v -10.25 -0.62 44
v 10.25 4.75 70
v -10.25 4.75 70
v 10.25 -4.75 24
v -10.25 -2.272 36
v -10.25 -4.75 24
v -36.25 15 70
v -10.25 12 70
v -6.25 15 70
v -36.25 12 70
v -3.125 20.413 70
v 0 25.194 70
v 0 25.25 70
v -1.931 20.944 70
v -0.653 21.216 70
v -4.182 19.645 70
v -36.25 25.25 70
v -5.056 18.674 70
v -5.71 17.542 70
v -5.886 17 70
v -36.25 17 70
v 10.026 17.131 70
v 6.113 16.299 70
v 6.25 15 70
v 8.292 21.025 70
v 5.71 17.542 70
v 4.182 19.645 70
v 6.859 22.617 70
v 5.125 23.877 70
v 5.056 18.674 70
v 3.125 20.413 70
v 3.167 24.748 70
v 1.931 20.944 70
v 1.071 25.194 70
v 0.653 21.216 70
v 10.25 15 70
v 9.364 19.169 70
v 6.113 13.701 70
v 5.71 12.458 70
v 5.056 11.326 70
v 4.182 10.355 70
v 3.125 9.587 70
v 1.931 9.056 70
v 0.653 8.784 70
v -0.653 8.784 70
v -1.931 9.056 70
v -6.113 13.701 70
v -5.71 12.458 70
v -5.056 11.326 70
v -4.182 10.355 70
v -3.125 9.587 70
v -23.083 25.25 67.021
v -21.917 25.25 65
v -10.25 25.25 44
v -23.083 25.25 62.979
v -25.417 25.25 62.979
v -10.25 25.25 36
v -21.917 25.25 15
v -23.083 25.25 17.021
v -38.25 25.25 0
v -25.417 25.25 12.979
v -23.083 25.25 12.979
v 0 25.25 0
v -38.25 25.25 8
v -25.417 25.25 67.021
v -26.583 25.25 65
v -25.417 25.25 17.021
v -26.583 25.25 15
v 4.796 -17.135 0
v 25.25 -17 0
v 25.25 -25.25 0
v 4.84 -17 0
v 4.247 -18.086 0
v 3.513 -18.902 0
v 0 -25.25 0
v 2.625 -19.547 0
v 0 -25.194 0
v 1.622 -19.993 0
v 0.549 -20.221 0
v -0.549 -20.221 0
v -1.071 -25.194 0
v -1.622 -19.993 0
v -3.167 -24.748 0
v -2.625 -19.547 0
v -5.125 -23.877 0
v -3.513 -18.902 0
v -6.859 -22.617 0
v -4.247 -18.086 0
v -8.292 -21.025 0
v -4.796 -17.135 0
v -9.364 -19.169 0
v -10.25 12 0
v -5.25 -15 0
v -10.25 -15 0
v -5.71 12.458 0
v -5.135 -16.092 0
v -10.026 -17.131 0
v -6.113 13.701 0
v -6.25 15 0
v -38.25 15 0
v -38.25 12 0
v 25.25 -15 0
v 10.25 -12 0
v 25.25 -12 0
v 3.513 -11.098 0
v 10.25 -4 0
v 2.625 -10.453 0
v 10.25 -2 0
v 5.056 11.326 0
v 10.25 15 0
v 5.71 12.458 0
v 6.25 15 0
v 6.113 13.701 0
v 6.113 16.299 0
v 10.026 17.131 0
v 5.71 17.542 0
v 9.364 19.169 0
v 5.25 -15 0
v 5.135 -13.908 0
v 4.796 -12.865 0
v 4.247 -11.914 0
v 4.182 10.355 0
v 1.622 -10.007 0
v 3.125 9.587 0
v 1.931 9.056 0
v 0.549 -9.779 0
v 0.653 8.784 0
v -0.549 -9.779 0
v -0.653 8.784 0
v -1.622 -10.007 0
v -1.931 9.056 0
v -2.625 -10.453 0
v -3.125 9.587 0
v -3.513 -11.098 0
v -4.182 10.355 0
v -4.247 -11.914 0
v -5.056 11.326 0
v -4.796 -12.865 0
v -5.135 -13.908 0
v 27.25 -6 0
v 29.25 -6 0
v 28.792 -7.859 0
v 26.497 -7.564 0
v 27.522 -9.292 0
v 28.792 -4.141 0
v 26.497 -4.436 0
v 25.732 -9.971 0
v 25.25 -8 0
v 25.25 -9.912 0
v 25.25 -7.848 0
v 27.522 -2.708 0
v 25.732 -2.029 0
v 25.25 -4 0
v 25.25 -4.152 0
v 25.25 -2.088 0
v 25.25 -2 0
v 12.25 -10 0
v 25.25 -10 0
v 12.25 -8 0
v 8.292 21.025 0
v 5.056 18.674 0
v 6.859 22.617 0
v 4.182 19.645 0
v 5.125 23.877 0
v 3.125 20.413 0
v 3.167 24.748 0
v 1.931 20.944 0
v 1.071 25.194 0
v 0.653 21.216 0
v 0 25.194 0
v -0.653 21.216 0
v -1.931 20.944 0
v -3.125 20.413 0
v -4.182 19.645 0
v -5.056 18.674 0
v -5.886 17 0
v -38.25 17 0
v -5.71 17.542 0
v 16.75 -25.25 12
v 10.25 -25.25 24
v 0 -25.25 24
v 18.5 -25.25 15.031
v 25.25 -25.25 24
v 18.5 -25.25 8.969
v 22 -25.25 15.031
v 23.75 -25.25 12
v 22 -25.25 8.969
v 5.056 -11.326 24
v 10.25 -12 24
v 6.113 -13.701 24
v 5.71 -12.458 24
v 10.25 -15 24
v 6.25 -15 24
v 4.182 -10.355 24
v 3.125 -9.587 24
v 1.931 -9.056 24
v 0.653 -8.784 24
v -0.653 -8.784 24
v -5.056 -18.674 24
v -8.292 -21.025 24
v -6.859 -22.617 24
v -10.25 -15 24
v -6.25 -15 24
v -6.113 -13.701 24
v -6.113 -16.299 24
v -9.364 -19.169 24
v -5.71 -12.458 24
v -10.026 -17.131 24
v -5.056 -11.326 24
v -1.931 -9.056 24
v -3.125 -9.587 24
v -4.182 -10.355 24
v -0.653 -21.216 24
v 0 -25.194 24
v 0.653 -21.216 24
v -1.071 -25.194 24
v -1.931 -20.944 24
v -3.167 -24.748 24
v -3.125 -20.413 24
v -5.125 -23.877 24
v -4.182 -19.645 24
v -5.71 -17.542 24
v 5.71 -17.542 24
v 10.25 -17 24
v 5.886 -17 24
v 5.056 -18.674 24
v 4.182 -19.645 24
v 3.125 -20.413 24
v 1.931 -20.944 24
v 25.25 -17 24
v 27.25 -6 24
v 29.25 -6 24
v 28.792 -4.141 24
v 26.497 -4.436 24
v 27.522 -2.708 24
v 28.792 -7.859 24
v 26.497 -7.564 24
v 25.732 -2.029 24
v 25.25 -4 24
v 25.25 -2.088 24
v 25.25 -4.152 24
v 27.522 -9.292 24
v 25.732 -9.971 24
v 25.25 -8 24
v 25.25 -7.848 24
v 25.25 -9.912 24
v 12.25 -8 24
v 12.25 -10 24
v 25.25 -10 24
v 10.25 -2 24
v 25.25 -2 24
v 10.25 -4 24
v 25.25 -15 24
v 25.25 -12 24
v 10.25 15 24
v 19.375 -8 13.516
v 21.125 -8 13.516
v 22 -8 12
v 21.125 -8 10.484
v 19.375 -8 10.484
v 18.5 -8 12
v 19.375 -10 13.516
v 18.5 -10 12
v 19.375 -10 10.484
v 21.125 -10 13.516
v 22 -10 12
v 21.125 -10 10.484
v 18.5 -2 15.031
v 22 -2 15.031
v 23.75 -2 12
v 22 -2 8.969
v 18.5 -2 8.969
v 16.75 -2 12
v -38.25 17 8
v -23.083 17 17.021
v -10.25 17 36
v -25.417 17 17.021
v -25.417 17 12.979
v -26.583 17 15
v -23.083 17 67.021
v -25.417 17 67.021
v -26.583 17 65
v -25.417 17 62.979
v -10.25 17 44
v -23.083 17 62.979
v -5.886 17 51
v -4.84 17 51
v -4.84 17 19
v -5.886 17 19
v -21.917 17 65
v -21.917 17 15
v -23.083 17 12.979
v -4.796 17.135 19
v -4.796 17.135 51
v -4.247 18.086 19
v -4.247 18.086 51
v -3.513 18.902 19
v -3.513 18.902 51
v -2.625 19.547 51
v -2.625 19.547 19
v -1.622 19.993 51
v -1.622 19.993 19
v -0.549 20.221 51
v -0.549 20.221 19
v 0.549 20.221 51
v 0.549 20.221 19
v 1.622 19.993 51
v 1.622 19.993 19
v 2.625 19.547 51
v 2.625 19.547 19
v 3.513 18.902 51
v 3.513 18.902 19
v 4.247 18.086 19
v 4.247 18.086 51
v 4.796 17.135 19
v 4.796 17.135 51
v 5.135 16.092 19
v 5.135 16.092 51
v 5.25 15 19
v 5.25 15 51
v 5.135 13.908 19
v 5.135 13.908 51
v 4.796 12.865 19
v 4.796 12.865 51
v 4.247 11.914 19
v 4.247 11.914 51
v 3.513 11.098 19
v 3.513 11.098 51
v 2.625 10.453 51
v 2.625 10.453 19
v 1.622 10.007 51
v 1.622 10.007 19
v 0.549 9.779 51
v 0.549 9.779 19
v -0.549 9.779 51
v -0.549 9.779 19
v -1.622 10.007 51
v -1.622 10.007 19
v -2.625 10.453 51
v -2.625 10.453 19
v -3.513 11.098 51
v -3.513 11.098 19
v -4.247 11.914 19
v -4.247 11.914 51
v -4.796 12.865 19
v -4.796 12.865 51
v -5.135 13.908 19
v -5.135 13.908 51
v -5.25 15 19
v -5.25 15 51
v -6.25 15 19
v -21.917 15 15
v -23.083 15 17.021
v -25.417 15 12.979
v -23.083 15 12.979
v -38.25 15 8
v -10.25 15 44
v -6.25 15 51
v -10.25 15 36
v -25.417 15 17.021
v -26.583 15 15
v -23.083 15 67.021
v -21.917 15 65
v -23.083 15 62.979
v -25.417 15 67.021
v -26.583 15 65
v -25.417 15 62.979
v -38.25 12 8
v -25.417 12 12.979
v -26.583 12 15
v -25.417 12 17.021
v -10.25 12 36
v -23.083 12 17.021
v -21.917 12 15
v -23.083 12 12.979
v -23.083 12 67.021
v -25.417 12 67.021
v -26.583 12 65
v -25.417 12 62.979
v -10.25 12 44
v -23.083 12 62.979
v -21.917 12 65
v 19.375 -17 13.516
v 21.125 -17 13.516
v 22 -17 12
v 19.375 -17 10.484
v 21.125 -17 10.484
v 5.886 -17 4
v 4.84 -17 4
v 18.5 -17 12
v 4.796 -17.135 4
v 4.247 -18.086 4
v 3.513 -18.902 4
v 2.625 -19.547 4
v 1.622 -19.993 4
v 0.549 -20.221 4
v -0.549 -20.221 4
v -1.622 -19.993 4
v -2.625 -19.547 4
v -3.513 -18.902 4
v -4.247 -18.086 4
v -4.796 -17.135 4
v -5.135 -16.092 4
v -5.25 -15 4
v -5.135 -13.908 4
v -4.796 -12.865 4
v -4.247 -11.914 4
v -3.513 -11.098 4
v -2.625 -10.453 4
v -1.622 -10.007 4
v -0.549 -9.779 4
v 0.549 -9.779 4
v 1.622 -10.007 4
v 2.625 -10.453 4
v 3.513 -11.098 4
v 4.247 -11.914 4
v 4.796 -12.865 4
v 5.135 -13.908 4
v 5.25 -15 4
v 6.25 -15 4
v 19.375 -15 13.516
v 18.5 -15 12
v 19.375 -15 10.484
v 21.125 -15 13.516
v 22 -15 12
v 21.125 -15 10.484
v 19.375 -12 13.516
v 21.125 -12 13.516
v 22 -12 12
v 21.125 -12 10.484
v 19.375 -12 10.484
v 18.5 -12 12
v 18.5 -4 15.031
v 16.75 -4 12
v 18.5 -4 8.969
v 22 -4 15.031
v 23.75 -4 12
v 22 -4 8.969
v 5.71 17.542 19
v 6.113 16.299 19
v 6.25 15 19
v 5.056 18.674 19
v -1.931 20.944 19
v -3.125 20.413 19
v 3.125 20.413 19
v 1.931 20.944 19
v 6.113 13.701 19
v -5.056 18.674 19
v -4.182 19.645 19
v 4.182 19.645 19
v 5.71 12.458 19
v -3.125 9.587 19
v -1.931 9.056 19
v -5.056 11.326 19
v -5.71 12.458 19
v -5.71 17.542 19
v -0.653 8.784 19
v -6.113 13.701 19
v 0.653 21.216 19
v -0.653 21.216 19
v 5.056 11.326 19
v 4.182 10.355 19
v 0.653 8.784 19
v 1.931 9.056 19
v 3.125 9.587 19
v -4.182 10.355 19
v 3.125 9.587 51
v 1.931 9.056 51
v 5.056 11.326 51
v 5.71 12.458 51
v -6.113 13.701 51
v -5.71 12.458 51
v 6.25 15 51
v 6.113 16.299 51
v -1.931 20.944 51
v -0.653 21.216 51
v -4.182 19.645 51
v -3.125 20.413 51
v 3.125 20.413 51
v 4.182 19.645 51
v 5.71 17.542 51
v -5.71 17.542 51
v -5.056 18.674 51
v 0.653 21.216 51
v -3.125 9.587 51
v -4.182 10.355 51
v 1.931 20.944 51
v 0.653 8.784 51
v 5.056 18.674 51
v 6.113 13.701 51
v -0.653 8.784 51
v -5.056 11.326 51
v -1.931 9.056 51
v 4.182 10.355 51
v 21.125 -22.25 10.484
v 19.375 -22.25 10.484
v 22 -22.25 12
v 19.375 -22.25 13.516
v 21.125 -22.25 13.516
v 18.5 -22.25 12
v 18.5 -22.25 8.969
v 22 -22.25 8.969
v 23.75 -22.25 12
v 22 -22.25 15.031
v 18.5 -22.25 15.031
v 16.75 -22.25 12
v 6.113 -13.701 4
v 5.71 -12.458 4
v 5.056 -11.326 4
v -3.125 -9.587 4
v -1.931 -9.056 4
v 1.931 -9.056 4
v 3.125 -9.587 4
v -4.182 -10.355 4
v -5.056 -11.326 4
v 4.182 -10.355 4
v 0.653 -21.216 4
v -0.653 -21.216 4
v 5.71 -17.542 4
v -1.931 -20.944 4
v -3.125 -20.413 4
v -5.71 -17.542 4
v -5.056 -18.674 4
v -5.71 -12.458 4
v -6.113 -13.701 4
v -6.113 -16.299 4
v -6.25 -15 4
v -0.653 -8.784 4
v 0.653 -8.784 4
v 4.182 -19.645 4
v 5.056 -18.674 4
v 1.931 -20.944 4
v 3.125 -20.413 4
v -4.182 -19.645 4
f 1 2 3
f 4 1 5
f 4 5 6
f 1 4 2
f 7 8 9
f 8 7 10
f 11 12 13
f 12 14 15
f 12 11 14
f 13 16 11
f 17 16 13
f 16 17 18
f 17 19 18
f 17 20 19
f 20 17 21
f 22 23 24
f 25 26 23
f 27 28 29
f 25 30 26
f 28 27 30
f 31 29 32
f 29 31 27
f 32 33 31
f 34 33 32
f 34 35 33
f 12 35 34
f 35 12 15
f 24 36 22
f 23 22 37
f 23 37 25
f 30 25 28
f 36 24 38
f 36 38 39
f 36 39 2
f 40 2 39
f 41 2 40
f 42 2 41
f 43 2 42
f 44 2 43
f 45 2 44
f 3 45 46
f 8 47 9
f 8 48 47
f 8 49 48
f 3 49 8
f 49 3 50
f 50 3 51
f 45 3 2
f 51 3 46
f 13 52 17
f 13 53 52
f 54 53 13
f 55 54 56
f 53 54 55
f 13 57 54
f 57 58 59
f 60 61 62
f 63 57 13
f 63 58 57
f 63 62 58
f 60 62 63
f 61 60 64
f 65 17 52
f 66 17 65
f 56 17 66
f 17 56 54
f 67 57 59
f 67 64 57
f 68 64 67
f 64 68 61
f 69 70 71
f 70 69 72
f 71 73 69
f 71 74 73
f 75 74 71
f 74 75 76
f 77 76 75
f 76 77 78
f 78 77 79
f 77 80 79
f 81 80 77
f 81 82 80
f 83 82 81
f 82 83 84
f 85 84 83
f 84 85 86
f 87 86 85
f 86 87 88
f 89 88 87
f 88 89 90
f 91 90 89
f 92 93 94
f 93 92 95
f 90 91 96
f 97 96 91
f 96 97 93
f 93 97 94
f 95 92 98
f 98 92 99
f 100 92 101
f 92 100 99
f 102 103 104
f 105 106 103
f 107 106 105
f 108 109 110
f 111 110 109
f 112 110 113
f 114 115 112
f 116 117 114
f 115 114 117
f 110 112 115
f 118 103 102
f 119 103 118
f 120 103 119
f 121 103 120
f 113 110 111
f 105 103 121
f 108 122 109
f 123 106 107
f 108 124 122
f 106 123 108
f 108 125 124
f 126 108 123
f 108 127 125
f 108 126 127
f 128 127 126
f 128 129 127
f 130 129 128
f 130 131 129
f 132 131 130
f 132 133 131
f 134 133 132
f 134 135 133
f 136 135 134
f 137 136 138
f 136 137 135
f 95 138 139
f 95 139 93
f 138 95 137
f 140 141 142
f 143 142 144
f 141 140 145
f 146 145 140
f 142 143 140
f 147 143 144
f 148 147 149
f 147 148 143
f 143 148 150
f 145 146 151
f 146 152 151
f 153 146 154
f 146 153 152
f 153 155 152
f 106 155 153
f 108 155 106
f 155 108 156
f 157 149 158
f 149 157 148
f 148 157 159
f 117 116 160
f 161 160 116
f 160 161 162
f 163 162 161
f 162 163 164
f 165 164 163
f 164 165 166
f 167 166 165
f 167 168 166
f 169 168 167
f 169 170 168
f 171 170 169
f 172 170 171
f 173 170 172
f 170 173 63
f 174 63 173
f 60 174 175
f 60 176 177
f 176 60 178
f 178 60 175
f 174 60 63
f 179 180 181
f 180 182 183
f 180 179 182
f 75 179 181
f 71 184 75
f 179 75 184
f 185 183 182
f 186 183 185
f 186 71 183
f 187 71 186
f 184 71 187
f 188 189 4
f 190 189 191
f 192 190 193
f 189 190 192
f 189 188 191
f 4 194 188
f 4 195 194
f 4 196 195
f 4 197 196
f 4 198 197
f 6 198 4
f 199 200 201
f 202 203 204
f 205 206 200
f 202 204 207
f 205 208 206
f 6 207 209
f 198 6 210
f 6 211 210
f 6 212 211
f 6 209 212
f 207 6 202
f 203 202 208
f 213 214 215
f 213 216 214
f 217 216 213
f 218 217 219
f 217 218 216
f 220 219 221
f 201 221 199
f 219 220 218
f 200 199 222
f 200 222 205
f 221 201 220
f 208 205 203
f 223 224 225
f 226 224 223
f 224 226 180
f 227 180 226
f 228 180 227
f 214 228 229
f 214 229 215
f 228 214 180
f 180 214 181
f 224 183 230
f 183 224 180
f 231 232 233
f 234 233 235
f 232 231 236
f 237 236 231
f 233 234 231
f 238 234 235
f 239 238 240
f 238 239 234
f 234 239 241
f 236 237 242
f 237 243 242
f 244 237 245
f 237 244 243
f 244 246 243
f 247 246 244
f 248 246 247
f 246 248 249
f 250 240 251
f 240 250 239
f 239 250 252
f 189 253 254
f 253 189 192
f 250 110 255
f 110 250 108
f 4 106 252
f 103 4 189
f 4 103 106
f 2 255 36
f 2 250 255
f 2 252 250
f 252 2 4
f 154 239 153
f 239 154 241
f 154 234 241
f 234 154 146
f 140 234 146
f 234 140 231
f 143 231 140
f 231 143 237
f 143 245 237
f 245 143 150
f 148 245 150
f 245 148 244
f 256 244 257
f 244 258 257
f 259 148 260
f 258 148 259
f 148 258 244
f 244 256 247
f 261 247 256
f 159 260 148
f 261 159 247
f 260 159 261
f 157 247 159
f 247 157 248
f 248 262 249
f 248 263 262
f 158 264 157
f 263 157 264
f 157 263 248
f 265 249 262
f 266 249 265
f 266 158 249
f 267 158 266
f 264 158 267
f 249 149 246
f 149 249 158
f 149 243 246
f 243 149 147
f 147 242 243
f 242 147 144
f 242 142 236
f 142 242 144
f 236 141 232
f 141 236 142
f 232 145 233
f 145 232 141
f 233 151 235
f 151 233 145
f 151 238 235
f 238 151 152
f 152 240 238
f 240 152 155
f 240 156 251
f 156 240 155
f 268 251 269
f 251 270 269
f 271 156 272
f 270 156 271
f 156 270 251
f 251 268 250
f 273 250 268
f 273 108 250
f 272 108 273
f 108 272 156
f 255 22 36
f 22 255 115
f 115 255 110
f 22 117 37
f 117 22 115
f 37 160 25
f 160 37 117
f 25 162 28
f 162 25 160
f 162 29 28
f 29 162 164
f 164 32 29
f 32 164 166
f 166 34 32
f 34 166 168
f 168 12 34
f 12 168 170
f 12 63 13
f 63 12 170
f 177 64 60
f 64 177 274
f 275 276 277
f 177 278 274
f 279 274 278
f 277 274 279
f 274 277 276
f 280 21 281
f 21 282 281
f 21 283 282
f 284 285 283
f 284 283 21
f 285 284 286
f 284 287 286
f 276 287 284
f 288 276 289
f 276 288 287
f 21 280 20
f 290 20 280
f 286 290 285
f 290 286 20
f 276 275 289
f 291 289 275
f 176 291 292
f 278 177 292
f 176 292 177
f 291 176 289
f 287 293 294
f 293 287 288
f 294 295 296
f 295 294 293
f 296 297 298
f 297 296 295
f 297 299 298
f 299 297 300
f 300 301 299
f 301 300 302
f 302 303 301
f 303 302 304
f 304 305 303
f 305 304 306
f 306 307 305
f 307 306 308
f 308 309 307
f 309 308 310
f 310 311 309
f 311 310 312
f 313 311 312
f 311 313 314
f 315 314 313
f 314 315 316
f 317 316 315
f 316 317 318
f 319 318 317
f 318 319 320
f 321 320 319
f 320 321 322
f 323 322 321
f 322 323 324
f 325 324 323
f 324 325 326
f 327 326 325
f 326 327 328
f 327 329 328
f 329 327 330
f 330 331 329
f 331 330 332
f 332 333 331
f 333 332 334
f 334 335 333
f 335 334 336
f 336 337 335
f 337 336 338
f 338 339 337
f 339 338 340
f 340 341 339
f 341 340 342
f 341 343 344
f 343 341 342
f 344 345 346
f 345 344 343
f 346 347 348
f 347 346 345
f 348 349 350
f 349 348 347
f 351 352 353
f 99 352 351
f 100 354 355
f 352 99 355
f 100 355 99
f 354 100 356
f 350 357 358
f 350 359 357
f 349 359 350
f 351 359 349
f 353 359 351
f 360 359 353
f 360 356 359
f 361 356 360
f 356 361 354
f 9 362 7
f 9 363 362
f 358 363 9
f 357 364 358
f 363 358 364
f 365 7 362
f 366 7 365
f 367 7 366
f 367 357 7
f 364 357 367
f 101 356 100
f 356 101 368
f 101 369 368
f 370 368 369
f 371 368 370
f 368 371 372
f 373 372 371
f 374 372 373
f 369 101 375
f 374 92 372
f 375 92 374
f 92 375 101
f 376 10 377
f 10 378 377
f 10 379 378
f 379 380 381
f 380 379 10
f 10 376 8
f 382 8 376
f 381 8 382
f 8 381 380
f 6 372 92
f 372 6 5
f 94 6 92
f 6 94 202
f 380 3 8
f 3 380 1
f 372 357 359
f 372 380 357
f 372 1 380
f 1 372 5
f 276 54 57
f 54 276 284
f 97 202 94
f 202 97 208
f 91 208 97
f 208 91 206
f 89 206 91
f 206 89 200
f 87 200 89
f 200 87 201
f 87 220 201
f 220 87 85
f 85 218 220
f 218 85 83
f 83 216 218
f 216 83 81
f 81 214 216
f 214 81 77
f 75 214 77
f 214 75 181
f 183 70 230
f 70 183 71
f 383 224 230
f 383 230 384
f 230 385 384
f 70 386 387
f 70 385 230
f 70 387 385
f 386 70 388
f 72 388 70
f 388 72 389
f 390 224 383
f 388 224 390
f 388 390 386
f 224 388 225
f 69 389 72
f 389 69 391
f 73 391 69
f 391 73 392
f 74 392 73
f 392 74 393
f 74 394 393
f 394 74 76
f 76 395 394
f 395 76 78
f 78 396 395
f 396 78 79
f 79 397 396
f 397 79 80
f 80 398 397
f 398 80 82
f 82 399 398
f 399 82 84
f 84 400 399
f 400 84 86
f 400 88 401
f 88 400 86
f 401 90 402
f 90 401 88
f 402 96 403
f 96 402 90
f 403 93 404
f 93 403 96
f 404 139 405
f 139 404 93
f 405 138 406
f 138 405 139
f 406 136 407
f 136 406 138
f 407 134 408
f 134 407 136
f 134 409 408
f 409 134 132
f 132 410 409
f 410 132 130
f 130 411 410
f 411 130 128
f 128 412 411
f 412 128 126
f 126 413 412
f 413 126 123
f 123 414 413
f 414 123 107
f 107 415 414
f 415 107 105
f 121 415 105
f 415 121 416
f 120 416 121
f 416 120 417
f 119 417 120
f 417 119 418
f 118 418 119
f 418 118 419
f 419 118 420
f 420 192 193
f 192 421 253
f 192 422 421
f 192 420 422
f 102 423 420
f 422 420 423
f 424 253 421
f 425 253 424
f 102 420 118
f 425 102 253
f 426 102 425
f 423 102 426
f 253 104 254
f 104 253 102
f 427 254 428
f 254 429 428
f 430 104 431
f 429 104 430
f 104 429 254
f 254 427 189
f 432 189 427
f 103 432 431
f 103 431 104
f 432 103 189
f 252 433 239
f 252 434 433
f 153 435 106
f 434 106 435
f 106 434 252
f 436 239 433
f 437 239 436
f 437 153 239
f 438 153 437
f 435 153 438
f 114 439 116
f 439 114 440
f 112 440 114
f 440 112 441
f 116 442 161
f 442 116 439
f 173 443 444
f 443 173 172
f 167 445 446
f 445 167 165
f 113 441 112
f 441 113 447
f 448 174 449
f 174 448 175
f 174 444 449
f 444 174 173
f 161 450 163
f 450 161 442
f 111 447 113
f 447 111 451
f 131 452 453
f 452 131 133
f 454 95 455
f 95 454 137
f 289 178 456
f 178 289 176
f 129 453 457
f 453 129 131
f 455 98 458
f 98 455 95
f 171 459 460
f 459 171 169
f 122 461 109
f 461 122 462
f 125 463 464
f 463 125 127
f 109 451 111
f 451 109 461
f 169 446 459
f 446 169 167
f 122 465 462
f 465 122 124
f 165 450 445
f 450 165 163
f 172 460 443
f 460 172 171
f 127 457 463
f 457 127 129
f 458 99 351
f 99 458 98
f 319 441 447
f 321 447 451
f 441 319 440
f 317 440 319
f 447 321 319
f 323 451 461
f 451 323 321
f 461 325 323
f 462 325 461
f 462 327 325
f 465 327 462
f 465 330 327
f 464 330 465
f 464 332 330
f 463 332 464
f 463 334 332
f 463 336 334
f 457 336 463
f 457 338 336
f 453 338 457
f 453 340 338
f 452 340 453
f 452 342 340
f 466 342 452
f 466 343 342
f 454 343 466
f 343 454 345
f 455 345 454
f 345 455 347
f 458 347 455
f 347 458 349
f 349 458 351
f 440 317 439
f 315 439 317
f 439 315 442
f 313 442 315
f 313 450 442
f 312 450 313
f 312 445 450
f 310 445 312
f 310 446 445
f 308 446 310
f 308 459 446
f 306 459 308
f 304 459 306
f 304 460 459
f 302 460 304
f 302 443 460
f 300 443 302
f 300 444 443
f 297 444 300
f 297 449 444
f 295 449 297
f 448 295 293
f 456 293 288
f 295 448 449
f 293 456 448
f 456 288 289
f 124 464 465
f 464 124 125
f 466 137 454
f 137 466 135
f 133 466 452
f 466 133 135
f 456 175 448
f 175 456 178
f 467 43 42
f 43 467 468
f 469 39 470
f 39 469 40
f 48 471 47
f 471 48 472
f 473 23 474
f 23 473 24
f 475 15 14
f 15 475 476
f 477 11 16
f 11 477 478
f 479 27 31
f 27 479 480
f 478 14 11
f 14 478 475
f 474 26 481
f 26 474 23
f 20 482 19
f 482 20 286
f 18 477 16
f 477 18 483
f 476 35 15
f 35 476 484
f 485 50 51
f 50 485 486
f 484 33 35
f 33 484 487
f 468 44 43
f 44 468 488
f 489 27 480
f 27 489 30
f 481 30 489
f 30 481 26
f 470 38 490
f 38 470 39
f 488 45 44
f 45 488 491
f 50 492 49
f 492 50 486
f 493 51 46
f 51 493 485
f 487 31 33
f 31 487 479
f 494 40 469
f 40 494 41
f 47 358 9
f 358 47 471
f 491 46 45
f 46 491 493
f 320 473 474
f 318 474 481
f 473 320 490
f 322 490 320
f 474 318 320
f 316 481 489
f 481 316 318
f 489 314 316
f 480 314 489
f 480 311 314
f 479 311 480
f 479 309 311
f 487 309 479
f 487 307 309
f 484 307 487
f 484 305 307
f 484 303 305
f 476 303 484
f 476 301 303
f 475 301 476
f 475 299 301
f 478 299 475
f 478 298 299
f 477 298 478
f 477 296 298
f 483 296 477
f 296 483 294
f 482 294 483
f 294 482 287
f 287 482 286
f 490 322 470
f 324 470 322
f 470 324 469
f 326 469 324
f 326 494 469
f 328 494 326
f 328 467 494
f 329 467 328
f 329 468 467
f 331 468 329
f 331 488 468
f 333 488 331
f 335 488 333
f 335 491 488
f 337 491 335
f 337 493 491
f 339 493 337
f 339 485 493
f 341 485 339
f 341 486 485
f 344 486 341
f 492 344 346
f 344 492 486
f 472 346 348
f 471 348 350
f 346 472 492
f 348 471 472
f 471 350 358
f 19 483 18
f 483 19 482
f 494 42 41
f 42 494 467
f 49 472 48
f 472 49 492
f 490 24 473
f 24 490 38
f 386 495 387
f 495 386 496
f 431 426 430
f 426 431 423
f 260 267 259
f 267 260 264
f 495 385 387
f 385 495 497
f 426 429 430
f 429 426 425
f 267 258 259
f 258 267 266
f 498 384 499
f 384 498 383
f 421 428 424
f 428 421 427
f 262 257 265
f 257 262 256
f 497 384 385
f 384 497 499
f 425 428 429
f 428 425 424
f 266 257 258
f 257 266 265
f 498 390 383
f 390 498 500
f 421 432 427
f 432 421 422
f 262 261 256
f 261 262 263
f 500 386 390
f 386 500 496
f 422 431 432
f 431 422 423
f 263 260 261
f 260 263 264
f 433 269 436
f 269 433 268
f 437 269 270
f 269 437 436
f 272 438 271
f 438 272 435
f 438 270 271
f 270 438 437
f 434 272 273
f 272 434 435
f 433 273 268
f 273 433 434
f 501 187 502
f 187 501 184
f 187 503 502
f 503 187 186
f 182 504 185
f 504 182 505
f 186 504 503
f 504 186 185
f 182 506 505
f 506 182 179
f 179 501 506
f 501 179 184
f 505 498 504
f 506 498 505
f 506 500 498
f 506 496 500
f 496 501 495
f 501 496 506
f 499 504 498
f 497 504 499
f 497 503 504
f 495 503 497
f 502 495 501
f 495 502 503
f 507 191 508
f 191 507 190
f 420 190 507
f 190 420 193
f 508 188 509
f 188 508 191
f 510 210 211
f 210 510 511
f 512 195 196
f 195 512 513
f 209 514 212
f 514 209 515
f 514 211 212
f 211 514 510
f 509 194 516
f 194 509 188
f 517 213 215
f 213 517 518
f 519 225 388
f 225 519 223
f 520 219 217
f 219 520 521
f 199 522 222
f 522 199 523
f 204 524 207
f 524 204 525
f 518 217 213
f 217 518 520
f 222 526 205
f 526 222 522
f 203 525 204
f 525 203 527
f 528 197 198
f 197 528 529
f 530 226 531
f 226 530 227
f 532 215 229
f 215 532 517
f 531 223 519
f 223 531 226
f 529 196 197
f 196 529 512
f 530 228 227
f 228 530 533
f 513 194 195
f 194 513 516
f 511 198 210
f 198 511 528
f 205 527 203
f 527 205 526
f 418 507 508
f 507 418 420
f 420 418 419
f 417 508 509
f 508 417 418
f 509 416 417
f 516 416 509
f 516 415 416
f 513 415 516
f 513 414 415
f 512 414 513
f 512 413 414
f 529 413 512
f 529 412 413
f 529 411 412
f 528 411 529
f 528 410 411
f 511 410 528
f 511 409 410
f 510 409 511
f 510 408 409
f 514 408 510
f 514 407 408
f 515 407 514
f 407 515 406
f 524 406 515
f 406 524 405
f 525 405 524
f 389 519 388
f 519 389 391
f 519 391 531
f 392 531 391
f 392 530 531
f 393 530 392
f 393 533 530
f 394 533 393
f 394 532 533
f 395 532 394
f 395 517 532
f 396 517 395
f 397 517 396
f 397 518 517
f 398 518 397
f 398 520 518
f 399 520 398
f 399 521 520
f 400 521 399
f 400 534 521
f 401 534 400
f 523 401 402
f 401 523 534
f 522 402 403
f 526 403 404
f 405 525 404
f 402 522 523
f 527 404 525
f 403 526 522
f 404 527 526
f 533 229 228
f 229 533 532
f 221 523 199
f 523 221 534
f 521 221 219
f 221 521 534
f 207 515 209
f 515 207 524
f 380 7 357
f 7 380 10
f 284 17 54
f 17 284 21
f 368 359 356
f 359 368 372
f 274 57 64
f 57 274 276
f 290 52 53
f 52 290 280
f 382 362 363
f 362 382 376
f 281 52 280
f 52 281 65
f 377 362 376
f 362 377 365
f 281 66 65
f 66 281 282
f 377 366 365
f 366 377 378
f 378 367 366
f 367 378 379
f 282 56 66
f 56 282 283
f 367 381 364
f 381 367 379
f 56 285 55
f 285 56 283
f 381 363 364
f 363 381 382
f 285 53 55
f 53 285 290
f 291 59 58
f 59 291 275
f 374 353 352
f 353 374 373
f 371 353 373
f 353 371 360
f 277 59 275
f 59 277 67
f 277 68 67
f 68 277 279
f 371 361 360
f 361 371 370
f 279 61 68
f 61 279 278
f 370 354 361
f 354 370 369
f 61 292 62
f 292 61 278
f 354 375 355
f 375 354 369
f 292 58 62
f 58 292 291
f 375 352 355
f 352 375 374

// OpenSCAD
// file: configuration.scad
// default configuration
// m6 rods and nema14 motors

rod_size = 6;
rod_nut_size = 12; //12 for M6, 16 for M8
bearing_size = 12.5; //12 for LM6UU, 15 for LM8UU,LM8SUU
bearing_length = 20; //19 for LM6UU, 17 for LM8SUU, 24 for LM8UU
yz_motor_distance = 25;
motor_screw_spacing = 26; //26 for NEMA14, 31 for NEMA17
motor_casing = 38; //38 for NEMA14, 45 for NEMA17
end_height = 40;
bed_mount_height = 16;
//x_rod_spacing = motor_screw_spacing + 3 + rod_size;
x_rod_spacing = 30;
x_carriage_width = 70;
carriage_extruder_offset = 5;
pulley_size = 20;
idler_pulley_width = 10;
gusset_size = 15;
// main file
//x carriage

include <configuration.scad>



module x_carriage() difference() {
	intersection() {
		linear_extrude(height = x_carriage_width, convexity = 5) difference() {
			union() {
				square([bearing_size + 8, x_rod_spacing], center = true);
				translate([0, -x_rod_spacing / 2 - bearing_size / 2 - 4, 0]) square([bearing_size / 2 + 4 + 15, x_rod_spacing / 2 + bearing_size / 2 + 4 - 2 - pulley_size / 2]);
				translate([0, -pulley_size / 2, 0]) {
					square([bearing_size / 2 + 4 + 15, 8]);
					translate([bearing_size / 2 + 4 + 15, 4, 0]) circle(4);
				}
				rotate(180) translate([0, -x_rod_spacing / 2 - bearing_size / 2 - 4, 0]) square([bearing_size / 2 + 4 + 28, bearing_size / 2 + 4 + 3]);
				for(side = [1, -1]) translate([0, side * x_rod_spacing / 2, 0]) circle(bearing_size / 2 + 4, $fn = 30);
			}
			translate([bearing_size / 2 + 4, 2 - pulley_size / 2, 0]) {
				square([15, 4]);
				translate([0, -3, 0]) square([2, 4]);
				translate([15, 2, 0]) circle(2);
			}
			for(side = [1, -1]) translate([0, side * x_rod_spacing / 2, 0]) {
				circle(bearing_size / 2 -1, $fn = 30);
				rotate(90 * side) square([2, bearing_size / 2 + 40]);
			}
		}
		difference() {
			rotate([0, -90, 0]) linear_extrude(height = bearing_size + 100, convexity = 5, center = true) difference() {
				polygon([
					[
						0,
						(x_rod_spacing / 2 + bearing_size / 2 + 4)
					],[
						0,
						-(x_rod_spacing / 2 + bearing_size / 2 + 4)
					],[
						bearing_length + 4,
						-(x_rod_spacing / 2 + bearing_size / 2 + 4)
					],[
						bearing_length + 4,
						-(x_rod_spacing / 2 - bearing_size / 2 - 4)
					],[
						x_carriage_width,
						(x_rod_spacing / 2 - bearing_size / 2 - 4)
					],[
						x_carriage_width,
						(x_rod_spacing / 2 + bearing_size / 2 + 4)
					]
				]);
			}
			translate([bearing_size / 2 + 4, -50, bearing_length + 4]) cube(100);
		}
	}
	translate([0, x_rod_spacing / 2, 0]) rotate([0, 0, 0]) {
		%translate([0, 0, 20]) rotate(180 / 8) cylinder(r = rod_size * 13/24, h = 200, center = true, $fn = 8);
		for(end = [0, 1]) mirror([0, 0, end]) translate([0, 0, end * -x_carriage_width - 1]) cylinder(r = bearing_size / 2, h = bearing_length, $fn = 30);
	}
	translate([0, -x_rod_spacing / 2, 0]) rotate([0, 0, 0]) {
		translate([0, 0, 4]) cylinder(r = bearing_size / 2, h = x_carriage_width + 1, center = false, $fn = 30);
		%translate([0, 0,20]) rotate(180 / 8) cylinder(r = rod_size * 13/24, h = 200, center = true, $fn = 8);
	}
	translate([bearing_size / 2 + 4 + 10, 5 - pulley_size / 2, bearing_length / 2 + 2]) rotate([90, 0, 0]) {
		cylinder(r = 3 * 7/12, h = x_rod_spacing + bearing_size + 10, center = true, $fn = 6);
		rotate([180, 0, 0]) cylinder(r = 6 * 7/12, h = x_rod_spacing + bearing_size + 10, center = false, $fn = 6);
		translate([0, 0, x_rod_spacing / 2 + bearing_size / 2 + 6 - pulley_size / 2]) cylinder(r = 3 * 7/6, h = x_rod_spacing + bearing_size + 10, center = false, $fn = 6);
	}
	//#for(side = [1, -1]) translate([-bearing_size / 2 - 4 - 14, 0, x_carriage_width / 2 + carriage_extruder_offset + side * 25]) rotate([90, 0, 0]) cylinder(r = 4.1, h = x_rod_spacing - 10, center = true, $fn = 6);
	translate([-bearing_size / 2 - 4 - 14, 0, x_carriage_width / 2 + carriage_extruder_offset]) rotate([90, 0, 0]) linear_extrude(height = bearing_size + x_rod_spacing + 10, center = true, convexity = 5) {
		*translate([-14, 0, 0]) {
			circle(20);
			rotate(45) square(5);
		}
		intersection() {
			translate([18, 0, 0]) rotate(135) square(100);
			translate([-14, 0, 0]) square([56, 100], center = true);
		}
		for(side = [1, -1]) translate([0, side * 25, 0]) circle(4 * 7/12, $fn = 6);
	}
}

x_carriage();
